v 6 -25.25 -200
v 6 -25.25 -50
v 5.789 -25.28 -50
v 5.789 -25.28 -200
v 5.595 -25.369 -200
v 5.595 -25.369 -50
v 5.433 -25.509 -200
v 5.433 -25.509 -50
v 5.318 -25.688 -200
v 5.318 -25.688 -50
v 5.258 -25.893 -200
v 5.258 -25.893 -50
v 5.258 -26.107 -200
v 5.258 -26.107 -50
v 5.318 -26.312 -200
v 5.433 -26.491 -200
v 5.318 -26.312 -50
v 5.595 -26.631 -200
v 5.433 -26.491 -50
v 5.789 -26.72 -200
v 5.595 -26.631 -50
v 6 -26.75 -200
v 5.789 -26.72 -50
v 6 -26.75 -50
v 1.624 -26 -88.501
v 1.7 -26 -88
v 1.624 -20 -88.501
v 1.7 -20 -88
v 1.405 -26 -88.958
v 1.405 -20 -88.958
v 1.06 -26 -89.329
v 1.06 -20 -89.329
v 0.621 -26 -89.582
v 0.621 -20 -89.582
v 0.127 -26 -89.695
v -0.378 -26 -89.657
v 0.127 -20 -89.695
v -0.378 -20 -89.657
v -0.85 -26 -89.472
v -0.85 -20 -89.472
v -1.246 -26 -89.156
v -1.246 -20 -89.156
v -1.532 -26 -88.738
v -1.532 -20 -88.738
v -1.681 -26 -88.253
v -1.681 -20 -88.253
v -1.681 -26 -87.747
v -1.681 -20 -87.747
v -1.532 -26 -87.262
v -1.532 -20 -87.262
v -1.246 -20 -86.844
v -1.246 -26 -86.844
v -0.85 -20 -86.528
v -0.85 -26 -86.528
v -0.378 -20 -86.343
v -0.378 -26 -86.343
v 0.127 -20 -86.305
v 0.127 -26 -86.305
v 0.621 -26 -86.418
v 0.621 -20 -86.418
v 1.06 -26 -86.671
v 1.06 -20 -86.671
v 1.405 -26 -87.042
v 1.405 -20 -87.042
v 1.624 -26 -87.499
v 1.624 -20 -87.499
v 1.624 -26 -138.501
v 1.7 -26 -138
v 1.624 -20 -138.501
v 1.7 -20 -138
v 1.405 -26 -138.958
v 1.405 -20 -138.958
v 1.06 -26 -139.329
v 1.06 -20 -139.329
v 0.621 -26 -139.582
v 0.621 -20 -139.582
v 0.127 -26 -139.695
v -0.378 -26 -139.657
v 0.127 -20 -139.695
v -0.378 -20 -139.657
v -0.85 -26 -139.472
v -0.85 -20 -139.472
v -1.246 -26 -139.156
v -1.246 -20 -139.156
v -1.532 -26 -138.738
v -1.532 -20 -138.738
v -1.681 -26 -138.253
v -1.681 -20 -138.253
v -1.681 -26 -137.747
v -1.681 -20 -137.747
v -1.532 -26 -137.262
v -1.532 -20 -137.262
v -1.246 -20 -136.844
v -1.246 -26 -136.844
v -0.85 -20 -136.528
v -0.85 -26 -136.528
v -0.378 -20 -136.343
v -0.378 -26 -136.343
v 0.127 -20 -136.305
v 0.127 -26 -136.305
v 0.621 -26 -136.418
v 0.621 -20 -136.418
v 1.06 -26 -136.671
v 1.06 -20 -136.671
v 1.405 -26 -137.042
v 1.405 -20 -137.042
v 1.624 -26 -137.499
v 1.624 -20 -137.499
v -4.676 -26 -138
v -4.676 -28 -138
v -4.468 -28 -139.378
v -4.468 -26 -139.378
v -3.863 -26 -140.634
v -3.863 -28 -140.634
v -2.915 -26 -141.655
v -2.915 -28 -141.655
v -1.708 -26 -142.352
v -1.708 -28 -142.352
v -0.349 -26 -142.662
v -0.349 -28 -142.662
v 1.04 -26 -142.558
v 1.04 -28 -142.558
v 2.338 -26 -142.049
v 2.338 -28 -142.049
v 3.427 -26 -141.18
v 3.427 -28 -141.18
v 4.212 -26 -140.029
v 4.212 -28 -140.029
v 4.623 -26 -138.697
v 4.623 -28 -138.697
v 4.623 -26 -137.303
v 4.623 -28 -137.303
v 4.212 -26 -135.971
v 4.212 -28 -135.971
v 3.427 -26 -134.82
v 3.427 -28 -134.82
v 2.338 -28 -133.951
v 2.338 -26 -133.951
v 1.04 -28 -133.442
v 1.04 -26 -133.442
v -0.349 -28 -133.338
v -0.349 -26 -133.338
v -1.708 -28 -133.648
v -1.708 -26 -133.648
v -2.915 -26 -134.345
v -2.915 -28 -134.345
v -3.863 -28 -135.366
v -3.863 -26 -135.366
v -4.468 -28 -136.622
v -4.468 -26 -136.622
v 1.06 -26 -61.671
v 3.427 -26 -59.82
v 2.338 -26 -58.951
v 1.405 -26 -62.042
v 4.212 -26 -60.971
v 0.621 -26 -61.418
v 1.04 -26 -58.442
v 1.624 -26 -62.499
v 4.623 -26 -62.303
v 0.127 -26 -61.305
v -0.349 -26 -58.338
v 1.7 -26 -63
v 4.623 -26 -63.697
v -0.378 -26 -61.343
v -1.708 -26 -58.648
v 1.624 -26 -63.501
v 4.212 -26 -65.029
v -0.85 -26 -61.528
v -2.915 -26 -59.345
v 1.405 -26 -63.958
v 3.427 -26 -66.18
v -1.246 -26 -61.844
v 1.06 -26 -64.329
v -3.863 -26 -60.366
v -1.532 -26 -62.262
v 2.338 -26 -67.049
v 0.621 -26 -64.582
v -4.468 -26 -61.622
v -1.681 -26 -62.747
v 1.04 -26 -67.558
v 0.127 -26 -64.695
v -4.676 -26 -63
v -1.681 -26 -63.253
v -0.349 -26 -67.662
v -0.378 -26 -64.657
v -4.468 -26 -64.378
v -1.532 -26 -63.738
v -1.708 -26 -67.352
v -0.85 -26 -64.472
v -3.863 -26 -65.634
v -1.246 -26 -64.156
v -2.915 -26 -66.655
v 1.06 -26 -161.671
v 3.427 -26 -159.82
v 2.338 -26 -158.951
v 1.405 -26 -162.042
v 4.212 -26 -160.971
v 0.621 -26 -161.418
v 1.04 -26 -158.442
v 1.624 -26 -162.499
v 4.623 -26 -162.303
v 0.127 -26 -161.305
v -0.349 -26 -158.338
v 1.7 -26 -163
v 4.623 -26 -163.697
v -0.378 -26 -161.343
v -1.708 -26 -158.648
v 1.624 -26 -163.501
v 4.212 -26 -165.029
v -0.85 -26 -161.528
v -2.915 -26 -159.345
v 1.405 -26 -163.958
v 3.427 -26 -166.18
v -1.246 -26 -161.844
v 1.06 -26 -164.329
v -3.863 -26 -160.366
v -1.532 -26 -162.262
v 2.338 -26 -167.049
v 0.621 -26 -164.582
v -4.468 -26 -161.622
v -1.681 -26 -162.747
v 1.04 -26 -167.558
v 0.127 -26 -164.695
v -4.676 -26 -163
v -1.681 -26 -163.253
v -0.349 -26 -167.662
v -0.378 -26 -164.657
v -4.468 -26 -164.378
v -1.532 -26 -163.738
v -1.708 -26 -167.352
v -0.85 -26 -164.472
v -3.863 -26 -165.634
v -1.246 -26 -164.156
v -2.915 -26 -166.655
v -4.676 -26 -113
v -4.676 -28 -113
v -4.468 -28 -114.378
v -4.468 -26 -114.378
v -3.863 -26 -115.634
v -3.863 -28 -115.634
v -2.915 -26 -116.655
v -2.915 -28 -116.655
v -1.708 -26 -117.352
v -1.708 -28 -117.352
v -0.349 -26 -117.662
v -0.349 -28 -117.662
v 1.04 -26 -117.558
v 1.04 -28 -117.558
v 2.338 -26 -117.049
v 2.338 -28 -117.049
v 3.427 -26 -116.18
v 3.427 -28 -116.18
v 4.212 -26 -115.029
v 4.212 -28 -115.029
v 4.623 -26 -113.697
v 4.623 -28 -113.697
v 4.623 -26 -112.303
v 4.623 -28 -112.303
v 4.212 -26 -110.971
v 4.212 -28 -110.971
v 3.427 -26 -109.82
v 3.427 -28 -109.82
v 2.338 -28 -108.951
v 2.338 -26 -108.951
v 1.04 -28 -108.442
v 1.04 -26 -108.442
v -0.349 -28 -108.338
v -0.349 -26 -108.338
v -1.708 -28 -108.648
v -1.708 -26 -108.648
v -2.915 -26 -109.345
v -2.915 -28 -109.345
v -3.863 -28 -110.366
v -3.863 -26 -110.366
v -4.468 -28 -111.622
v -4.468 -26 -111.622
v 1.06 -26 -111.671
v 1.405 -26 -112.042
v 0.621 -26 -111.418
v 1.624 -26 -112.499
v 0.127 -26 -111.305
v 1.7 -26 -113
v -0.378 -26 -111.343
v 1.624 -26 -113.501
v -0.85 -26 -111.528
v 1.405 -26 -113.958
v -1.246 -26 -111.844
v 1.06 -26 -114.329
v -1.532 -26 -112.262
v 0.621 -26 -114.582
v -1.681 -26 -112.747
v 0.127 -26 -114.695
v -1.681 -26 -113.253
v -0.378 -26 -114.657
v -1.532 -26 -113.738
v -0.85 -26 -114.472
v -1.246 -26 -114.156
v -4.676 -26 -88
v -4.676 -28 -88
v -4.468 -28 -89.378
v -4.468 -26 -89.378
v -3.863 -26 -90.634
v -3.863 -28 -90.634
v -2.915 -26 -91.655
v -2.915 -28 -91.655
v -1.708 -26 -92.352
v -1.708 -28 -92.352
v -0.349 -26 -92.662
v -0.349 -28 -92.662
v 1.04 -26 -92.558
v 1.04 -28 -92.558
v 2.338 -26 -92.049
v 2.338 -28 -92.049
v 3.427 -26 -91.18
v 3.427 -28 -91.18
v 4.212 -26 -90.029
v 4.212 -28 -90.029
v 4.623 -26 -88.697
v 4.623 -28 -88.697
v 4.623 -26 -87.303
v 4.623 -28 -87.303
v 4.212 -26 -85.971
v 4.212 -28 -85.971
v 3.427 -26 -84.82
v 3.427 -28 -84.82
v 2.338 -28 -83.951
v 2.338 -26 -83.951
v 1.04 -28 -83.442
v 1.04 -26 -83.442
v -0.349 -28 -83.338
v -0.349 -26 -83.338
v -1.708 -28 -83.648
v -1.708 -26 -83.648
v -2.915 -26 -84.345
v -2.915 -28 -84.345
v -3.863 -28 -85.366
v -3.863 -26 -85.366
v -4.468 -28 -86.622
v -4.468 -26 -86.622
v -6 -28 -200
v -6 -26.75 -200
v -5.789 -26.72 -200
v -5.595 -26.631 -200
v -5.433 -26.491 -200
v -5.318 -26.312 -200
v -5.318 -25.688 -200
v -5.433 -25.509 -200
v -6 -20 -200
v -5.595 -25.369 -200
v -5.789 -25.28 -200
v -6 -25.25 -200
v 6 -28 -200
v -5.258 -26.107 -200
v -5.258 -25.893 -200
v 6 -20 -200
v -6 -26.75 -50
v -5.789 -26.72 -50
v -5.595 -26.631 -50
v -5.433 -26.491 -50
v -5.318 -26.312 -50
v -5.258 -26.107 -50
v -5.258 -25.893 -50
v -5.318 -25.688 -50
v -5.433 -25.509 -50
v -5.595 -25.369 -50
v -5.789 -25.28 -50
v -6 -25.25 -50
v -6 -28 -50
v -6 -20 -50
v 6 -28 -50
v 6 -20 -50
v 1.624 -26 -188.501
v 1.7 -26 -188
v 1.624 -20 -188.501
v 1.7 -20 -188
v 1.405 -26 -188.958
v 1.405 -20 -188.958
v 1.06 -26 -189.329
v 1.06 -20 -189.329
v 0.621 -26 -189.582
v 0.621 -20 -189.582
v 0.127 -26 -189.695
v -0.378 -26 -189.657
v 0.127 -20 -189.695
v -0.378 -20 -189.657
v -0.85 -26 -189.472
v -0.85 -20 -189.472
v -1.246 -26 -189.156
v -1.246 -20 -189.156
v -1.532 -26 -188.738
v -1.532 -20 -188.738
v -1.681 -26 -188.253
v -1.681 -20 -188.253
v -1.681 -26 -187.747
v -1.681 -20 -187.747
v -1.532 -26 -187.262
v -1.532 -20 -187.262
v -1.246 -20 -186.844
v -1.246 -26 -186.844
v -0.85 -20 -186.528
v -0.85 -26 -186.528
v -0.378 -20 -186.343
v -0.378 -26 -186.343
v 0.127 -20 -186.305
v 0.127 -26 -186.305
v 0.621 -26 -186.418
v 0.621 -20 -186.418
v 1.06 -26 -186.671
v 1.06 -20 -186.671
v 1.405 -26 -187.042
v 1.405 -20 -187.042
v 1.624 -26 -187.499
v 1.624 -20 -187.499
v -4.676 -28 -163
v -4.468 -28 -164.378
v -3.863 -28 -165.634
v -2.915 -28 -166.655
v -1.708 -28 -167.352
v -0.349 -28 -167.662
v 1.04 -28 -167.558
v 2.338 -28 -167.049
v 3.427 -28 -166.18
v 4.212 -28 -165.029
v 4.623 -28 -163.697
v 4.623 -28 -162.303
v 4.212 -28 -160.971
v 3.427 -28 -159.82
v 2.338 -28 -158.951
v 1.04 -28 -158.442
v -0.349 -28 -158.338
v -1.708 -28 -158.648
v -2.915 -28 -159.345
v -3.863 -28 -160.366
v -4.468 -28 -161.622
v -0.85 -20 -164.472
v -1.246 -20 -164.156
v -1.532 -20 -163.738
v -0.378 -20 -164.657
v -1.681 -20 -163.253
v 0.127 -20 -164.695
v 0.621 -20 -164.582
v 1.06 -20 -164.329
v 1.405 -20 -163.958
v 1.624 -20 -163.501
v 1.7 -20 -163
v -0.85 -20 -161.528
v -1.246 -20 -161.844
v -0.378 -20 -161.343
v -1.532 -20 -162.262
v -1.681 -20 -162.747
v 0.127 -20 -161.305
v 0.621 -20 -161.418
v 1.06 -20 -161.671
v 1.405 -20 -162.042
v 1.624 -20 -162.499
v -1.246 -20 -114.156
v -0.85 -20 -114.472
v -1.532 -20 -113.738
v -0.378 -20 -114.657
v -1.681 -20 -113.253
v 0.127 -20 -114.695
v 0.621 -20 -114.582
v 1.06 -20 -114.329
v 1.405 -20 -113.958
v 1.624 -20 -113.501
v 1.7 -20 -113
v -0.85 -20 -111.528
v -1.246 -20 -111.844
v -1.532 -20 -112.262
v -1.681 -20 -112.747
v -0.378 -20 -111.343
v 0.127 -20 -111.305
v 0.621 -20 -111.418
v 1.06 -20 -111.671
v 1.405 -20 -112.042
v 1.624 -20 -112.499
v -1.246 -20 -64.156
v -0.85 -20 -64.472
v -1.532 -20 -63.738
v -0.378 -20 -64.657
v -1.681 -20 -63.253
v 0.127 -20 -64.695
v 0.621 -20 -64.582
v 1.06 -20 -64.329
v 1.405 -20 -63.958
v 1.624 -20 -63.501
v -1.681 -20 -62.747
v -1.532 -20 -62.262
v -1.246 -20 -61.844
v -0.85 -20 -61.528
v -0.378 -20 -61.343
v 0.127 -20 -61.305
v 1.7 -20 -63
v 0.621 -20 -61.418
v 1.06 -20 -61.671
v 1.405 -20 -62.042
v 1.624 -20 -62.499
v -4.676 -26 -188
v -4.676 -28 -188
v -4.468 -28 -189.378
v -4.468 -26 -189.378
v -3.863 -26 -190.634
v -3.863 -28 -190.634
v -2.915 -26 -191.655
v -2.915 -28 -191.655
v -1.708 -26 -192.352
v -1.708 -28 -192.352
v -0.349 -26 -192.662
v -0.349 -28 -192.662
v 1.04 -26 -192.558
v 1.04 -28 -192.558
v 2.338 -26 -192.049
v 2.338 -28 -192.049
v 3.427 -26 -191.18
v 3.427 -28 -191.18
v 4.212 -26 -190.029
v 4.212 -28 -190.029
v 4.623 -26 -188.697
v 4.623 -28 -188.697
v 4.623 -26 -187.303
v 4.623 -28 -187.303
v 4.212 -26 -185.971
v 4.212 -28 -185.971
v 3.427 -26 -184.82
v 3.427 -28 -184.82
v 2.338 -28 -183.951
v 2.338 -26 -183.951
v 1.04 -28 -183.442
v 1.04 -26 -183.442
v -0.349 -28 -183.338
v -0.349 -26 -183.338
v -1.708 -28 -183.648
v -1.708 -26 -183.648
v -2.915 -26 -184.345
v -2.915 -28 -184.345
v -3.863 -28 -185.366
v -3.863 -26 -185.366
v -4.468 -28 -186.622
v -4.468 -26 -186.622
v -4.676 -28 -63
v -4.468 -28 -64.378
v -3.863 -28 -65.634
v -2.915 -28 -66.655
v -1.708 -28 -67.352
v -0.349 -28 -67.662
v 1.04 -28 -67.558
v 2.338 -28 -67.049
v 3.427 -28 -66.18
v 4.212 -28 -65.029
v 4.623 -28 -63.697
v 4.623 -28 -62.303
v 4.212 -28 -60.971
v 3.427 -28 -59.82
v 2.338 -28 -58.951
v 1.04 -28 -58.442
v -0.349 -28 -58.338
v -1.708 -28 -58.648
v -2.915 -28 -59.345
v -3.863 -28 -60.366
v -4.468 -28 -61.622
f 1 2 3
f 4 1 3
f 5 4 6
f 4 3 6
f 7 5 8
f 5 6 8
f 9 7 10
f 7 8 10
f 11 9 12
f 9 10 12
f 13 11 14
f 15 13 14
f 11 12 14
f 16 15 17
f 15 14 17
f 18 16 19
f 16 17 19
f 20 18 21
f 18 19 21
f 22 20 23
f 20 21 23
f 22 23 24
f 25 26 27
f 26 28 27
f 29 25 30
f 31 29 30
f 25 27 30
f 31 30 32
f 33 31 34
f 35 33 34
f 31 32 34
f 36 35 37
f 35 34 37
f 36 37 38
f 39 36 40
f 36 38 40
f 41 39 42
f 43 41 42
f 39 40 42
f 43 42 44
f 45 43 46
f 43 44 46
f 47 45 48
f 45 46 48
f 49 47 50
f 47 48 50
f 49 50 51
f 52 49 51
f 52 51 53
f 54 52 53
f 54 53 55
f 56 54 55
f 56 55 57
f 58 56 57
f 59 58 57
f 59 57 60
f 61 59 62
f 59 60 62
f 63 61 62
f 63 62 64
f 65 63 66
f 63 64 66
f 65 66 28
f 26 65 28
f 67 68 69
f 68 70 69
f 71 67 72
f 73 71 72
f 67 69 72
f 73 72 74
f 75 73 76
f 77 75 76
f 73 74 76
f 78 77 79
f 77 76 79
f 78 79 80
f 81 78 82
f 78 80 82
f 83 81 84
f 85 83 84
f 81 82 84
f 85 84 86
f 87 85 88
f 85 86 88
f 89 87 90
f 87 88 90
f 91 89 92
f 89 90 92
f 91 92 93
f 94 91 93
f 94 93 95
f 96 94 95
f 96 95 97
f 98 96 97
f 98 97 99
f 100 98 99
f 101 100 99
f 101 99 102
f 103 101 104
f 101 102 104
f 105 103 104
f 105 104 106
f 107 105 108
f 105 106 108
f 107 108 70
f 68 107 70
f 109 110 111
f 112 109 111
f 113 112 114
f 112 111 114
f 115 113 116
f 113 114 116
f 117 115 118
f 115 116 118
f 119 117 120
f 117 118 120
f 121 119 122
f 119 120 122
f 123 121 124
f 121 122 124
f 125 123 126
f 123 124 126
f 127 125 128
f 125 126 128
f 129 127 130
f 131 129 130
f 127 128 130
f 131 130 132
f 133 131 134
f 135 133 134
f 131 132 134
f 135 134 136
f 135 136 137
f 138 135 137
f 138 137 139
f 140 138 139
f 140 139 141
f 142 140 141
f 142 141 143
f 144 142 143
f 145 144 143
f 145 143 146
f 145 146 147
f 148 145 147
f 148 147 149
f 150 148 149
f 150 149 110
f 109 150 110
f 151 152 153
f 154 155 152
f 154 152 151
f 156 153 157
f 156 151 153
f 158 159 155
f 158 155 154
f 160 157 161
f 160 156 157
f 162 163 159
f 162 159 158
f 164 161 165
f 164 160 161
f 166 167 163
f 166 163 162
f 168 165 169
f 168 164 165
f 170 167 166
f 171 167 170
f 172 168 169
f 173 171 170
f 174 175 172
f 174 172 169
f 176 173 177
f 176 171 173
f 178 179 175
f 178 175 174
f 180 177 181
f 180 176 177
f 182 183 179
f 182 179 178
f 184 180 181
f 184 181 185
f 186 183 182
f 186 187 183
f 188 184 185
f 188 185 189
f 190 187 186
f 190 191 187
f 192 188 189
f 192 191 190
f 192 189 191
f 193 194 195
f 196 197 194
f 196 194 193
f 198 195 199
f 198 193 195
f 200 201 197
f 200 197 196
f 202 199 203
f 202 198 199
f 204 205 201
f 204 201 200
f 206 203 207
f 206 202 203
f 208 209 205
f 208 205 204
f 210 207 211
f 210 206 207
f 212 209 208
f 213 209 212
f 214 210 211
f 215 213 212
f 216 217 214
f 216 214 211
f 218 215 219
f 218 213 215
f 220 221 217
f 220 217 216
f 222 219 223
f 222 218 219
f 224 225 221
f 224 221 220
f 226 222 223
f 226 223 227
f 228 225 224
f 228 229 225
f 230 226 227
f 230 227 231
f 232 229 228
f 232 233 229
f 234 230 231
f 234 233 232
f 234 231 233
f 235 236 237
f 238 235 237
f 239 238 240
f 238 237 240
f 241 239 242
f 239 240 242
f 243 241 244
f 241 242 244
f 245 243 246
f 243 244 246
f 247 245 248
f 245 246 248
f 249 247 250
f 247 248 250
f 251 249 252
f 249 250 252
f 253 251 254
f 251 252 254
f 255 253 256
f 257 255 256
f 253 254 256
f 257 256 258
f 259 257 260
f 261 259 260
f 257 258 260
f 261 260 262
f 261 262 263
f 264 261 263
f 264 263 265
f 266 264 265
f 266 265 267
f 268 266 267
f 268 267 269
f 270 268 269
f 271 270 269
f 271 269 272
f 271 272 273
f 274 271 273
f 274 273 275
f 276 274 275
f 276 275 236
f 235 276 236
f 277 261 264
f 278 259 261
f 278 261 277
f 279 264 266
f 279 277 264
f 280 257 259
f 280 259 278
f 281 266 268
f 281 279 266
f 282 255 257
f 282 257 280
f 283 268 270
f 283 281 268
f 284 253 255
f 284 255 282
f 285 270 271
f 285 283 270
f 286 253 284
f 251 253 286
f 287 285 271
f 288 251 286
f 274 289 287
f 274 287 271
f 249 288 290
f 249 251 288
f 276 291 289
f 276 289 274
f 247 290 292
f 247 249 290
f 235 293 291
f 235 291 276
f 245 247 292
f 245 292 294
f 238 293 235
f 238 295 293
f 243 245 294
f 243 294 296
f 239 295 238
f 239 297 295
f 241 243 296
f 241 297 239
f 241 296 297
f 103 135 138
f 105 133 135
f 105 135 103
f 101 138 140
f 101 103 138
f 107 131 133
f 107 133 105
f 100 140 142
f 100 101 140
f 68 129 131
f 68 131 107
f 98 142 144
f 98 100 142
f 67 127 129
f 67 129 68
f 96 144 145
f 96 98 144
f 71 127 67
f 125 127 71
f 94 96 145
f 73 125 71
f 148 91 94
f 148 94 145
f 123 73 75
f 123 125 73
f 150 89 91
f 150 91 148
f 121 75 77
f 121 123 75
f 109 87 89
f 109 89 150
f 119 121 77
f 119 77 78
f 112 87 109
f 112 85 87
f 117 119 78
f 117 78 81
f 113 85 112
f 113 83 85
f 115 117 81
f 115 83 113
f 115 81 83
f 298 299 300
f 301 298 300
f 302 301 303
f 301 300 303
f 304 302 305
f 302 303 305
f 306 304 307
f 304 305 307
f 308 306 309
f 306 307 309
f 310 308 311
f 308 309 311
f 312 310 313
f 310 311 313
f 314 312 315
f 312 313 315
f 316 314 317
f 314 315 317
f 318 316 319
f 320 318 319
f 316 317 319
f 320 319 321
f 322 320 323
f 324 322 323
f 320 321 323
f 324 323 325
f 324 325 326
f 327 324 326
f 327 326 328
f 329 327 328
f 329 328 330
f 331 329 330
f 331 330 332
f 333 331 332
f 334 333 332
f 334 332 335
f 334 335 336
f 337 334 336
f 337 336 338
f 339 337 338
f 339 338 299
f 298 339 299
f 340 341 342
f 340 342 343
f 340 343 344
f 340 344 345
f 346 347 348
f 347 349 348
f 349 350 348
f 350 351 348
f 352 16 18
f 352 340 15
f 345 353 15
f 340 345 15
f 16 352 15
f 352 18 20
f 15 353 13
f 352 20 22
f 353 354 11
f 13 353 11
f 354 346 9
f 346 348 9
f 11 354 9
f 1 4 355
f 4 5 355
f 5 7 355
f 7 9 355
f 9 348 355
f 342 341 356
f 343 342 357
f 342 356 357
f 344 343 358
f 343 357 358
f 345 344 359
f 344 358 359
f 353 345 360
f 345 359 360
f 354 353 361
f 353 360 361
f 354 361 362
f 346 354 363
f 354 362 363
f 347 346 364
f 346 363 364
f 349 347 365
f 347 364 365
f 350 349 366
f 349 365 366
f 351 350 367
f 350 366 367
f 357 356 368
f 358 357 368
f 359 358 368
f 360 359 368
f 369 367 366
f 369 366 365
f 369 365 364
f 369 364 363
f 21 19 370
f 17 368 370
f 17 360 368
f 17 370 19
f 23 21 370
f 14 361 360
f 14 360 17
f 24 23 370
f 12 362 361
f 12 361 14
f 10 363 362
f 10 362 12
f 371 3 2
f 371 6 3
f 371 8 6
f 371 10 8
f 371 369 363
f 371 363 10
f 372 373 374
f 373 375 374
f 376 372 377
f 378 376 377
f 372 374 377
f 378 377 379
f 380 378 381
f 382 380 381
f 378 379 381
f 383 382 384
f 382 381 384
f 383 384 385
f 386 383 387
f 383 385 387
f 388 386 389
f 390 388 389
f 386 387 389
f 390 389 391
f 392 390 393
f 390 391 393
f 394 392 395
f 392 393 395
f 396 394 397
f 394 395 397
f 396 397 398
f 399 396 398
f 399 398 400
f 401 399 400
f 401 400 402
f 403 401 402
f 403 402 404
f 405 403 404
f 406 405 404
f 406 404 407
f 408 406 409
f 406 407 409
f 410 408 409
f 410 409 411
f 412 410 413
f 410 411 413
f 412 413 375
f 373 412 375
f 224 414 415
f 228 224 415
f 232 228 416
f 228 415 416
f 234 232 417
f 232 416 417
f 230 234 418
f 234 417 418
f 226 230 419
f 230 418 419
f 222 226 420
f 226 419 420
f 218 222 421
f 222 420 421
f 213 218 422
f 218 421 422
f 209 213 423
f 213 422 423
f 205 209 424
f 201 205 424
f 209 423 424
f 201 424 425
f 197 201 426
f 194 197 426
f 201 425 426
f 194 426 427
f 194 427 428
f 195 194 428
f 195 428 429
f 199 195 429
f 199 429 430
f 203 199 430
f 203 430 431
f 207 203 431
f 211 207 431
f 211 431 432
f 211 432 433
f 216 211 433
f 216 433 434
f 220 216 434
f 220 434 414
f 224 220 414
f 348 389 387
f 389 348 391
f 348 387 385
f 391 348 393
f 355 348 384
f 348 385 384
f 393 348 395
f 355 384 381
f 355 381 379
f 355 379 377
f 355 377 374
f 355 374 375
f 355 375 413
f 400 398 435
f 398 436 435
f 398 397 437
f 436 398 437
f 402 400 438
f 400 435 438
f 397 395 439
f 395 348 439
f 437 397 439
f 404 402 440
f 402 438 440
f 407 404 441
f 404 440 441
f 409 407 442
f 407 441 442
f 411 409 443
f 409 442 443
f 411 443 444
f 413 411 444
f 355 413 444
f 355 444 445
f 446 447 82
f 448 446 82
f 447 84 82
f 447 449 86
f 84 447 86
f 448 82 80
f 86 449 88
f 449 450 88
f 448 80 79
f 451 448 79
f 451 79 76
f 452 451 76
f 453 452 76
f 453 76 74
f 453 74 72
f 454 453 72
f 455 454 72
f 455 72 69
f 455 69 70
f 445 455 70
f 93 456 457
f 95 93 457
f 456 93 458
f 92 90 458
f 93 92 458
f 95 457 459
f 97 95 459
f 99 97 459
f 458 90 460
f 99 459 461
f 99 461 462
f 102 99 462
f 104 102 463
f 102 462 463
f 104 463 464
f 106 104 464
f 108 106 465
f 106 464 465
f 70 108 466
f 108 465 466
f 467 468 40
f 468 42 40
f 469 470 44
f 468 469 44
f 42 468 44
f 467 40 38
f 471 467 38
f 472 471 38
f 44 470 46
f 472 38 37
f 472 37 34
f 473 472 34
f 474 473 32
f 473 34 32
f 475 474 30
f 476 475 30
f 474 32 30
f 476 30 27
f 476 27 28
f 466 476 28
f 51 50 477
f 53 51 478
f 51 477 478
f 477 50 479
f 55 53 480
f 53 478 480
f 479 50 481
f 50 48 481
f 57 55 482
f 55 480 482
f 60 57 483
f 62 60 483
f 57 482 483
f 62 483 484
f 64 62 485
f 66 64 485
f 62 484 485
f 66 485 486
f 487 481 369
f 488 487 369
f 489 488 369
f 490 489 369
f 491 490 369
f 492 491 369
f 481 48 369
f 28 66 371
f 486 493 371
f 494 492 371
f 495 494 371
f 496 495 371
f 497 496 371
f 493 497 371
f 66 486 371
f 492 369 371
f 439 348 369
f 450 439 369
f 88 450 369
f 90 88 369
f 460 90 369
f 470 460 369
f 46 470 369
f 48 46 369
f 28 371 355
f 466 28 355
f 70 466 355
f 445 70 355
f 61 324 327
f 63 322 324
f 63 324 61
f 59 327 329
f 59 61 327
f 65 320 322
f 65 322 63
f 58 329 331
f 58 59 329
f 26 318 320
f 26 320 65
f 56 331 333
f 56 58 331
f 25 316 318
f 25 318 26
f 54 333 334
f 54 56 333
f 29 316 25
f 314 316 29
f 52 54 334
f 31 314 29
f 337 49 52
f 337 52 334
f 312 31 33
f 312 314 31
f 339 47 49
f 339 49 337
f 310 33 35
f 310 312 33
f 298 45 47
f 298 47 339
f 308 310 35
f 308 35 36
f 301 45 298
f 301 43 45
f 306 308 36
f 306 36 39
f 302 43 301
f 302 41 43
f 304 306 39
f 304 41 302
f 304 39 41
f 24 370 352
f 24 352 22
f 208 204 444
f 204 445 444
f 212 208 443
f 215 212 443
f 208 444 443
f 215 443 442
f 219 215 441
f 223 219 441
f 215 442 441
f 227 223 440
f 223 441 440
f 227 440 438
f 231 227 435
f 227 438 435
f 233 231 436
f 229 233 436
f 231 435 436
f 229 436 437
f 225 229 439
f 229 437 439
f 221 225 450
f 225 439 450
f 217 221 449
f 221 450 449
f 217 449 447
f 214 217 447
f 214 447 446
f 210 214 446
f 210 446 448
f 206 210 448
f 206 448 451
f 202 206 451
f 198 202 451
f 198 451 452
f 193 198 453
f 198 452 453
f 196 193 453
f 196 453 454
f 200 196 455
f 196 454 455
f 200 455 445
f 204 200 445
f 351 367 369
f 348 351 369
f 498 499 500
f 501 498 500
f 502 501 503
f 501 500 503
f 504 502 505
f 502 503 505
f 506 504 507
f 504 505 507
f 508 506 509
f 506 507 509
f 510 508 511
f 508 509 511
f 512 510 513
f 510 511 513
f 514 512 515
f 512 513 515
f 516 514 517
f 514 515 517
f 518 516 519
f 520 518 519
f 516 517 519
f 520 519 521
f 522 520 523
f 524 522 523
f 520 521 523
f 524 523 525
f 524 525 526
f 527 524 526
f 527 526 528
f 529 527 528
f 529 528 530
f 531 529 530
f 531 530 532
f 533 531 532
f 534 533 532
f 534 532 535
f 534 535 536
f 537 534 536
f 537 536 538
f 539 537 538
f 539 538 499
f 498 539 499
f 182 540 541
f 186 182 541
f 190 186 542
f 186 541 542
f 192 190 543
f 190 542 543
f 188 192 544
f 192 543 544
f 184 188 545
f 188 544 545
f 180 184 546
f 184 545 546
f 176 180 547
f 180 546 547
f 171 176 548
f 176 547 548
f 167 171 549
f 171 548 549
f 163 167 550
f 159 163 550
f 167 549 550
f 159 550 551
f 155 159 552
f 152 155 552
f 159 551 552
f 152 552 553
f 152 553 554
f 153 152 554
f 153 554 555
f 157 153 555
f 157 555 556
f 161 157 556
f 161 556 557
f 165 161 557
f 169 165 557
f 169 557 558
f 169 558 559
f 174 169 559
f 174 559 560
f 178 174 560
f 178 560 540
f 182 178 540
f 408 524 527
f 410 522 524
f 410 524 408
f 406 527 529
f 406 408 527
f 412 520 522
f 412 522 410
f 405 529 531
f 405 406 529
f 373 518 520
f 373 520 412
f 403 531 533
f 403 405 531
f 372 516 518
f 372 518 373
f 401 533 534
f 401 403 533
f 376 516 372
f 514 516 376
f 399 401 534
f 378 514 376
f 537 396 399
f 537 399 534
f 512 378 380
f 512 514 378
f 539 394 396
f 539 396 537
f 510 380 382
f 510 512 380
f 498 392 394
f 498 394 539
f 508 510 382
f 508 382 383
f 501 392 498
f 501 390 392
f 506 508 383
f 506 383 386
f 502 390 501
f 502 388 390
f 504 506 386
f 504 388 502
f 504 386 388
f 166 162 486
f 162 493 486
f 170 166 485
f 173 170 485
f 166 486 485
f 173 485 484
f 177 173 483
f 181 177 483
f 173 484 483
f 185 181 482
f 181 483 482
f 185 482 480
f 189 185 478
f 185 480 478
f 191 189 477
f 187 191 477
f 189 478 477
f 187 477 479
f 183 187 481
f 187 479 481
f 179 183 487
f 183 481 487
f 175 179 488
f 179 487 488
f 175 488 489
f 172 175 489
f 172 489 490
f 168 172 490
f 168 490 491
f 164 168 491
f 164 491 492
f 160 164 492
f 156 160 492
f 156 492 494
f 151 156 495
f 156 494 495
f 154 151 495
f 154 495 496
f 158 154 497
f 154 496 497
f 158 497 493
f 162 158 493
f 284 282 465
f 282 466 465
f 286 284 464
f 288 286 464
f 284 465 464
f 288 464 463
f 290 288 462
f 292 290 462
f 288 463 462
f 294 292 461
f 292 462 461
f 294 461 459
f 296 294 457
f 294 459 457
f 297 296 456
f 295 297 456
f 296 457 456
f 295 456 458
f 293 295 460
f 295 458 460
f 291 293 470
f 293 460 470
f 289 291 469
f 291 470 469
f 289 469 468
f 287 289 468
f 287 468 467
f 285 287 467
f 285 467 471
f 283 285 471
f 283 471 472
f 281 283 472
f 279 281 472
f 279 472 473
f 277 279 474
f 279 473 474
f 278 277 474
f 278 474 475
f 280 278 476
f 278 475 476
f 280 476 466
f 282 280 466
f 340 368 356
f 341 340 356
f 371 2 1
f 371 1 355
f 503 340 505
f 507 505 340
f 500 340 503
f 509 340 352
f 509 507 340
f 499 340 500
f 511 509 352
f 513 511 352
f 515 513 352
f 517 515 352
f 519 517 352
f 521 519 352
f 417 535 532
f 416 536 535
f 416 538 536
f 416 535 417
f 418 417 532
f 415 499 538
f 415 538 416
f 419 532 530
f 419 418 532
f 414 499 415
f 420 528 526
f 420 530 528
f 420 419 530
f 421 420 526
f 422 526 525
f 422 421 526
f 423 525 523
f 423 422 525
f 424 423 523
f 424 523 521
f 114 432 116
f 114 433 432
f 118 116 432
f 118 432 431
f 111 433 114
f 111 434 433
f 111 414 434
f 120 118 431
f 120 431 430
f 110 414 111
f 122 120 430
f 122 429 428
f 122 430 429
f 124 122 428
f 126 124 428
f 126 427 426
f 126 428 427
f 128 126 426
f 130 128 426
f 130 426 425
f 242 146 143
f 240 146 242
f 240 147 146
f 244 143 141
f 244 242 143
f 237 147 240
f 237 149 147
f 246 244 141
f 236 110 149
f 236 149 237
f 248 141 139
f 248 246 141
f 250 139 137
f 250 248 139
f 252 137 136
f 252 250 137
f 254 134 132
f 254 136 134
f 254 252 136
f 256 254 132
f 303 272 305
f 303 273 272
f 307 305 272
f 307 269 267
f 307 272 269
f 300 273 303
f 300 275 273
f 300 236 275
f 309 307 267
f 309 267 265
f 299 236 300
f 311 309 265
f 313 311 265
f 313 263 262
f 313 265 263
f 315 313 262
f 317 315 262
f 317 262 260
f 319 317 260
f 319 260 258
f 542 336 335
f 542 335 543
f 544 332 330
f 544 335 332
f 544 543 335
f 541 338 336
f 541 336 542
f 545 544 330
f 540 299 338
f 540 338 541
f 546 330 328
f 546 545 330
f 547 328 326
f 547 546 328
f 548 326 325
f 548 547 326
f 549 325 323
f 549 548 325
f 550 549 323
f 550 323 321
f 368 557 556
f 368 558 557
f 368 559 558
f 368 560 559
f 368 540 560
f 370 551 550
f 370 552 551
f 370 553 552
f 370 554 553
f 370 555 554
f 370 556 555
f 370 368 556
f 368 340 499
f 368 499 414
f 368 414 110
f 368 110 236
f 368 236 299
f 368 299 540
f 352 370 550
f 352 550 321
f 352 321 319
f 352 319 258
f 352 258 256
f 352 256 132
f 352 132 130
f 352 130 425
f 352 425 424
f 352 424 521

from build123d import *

# Parameters (mm, degrees)
BOSS_EXTRUDE1_START                          = -50
SKETCH1_W                                    = 12
SKETCH1_H                                    = 8
BOSS_EXTRUDE1_DEPTH                          = 150
CUT_EXTRUDE1_REACH                           = 154.709
SKETCH2_R                                    = 0.75
CBORE_FOR_M3_HEX_HEAD_CAP_SCREW1_D           = 3.4
CBORE_FOR_M3_HEX_HEAD_CAP_SCREW1_CBORE_D     = 9.351
CBORE_FOR_M3_HEX_HEAD_CAP_SCREW1_CBORE_DEPTH = 2
LPATTERN2_COUNT                              = 6
LPATTERN2_PITCH                              = 25


with BuildPart() as part:
    # Sketch1 → Boss-Extrude1 (new body)
    with BuildSketch(Plane.XY.offset(BOSS_EXTRUDE1_START)):
        with Locations((0, -24)):
            Rectangle(SKETCH1_W, SKETCH1_H)
    extrude(amount=-BOSS_EXTRUDE1_DEPTH)

    # Sketch2 → Cut-Extrude1 (cut, up to next)
    with BuildSketch(Plane.XY.offset(-50), mode=Mode.PRIVATE) as cut_extrude1_sk1:
        with Locations((-6, -26)):
            Circle(SKETCH2_R)
    cut_extrude1_tool1 = extrude(cut_extrude1_sk1.sketch, amount=-CUT_EXTRUDE1_REACH, mode=Mode.PRIVATE) & part.part
    # Sketch2 → Cut-Extrude1 (cut, up to next)
    with BuildSketch(Plane.XY.offset(-50), mode=Mode.PRIVATE) as cut_extrude1_sk2:
        with Locations((6, -26)):
            Circle(SKETCH2_R)
    cut_extrude1_tool2 = extrude(cut_extrude1_sk2.sketch, amount=-CUT_EXTRUDE1_REACH, mode=Mode.PRIVATE) & part.part
    add(cut_extrude1_tool1.solids().sort_by_distance((-6, -26, -50))[0], mode=Mode.SUBTRACT)
    add(cut_extrude1_tool2.solids().sort_by_distance((6, -26, -50))[0], mode=Mode.SUBTRACT)

    # CBORE for M3 Hex Head Cap Screw1 (through all)
    with Locations(Plane(origin=(0, -28, 0), x_dir=(-1, 0, 0), z_dir=(0, -1, 0))):
        with Locations((0, 63)):
            cbore_for_m3_hex_head_cap_screw1 = CounterBoreHole(CBORE_FOR_M3_HEX_HEAD_CAP_SCREW1_D / 2, CBORE_FOR_M3_HEX_HEAD_CAP_SCREW1_CBORE_D / 2, CBORE_FOR_M3_HEX_HEAD_CAP_SCREW1_CBORE_DEPTH)

    # LPattern2: CBORE for M3 Hex Head Cap Screw1 ×6
    with Locations(*[(0, 0, -i * LPATTERN2_PITCH) for i in range(1, LPATTERN2_COUNT)]):
        add(cbore_for_m3_hex_head_cap_screw1, mode=Mode.SUBTRACT)


solid = part.part
